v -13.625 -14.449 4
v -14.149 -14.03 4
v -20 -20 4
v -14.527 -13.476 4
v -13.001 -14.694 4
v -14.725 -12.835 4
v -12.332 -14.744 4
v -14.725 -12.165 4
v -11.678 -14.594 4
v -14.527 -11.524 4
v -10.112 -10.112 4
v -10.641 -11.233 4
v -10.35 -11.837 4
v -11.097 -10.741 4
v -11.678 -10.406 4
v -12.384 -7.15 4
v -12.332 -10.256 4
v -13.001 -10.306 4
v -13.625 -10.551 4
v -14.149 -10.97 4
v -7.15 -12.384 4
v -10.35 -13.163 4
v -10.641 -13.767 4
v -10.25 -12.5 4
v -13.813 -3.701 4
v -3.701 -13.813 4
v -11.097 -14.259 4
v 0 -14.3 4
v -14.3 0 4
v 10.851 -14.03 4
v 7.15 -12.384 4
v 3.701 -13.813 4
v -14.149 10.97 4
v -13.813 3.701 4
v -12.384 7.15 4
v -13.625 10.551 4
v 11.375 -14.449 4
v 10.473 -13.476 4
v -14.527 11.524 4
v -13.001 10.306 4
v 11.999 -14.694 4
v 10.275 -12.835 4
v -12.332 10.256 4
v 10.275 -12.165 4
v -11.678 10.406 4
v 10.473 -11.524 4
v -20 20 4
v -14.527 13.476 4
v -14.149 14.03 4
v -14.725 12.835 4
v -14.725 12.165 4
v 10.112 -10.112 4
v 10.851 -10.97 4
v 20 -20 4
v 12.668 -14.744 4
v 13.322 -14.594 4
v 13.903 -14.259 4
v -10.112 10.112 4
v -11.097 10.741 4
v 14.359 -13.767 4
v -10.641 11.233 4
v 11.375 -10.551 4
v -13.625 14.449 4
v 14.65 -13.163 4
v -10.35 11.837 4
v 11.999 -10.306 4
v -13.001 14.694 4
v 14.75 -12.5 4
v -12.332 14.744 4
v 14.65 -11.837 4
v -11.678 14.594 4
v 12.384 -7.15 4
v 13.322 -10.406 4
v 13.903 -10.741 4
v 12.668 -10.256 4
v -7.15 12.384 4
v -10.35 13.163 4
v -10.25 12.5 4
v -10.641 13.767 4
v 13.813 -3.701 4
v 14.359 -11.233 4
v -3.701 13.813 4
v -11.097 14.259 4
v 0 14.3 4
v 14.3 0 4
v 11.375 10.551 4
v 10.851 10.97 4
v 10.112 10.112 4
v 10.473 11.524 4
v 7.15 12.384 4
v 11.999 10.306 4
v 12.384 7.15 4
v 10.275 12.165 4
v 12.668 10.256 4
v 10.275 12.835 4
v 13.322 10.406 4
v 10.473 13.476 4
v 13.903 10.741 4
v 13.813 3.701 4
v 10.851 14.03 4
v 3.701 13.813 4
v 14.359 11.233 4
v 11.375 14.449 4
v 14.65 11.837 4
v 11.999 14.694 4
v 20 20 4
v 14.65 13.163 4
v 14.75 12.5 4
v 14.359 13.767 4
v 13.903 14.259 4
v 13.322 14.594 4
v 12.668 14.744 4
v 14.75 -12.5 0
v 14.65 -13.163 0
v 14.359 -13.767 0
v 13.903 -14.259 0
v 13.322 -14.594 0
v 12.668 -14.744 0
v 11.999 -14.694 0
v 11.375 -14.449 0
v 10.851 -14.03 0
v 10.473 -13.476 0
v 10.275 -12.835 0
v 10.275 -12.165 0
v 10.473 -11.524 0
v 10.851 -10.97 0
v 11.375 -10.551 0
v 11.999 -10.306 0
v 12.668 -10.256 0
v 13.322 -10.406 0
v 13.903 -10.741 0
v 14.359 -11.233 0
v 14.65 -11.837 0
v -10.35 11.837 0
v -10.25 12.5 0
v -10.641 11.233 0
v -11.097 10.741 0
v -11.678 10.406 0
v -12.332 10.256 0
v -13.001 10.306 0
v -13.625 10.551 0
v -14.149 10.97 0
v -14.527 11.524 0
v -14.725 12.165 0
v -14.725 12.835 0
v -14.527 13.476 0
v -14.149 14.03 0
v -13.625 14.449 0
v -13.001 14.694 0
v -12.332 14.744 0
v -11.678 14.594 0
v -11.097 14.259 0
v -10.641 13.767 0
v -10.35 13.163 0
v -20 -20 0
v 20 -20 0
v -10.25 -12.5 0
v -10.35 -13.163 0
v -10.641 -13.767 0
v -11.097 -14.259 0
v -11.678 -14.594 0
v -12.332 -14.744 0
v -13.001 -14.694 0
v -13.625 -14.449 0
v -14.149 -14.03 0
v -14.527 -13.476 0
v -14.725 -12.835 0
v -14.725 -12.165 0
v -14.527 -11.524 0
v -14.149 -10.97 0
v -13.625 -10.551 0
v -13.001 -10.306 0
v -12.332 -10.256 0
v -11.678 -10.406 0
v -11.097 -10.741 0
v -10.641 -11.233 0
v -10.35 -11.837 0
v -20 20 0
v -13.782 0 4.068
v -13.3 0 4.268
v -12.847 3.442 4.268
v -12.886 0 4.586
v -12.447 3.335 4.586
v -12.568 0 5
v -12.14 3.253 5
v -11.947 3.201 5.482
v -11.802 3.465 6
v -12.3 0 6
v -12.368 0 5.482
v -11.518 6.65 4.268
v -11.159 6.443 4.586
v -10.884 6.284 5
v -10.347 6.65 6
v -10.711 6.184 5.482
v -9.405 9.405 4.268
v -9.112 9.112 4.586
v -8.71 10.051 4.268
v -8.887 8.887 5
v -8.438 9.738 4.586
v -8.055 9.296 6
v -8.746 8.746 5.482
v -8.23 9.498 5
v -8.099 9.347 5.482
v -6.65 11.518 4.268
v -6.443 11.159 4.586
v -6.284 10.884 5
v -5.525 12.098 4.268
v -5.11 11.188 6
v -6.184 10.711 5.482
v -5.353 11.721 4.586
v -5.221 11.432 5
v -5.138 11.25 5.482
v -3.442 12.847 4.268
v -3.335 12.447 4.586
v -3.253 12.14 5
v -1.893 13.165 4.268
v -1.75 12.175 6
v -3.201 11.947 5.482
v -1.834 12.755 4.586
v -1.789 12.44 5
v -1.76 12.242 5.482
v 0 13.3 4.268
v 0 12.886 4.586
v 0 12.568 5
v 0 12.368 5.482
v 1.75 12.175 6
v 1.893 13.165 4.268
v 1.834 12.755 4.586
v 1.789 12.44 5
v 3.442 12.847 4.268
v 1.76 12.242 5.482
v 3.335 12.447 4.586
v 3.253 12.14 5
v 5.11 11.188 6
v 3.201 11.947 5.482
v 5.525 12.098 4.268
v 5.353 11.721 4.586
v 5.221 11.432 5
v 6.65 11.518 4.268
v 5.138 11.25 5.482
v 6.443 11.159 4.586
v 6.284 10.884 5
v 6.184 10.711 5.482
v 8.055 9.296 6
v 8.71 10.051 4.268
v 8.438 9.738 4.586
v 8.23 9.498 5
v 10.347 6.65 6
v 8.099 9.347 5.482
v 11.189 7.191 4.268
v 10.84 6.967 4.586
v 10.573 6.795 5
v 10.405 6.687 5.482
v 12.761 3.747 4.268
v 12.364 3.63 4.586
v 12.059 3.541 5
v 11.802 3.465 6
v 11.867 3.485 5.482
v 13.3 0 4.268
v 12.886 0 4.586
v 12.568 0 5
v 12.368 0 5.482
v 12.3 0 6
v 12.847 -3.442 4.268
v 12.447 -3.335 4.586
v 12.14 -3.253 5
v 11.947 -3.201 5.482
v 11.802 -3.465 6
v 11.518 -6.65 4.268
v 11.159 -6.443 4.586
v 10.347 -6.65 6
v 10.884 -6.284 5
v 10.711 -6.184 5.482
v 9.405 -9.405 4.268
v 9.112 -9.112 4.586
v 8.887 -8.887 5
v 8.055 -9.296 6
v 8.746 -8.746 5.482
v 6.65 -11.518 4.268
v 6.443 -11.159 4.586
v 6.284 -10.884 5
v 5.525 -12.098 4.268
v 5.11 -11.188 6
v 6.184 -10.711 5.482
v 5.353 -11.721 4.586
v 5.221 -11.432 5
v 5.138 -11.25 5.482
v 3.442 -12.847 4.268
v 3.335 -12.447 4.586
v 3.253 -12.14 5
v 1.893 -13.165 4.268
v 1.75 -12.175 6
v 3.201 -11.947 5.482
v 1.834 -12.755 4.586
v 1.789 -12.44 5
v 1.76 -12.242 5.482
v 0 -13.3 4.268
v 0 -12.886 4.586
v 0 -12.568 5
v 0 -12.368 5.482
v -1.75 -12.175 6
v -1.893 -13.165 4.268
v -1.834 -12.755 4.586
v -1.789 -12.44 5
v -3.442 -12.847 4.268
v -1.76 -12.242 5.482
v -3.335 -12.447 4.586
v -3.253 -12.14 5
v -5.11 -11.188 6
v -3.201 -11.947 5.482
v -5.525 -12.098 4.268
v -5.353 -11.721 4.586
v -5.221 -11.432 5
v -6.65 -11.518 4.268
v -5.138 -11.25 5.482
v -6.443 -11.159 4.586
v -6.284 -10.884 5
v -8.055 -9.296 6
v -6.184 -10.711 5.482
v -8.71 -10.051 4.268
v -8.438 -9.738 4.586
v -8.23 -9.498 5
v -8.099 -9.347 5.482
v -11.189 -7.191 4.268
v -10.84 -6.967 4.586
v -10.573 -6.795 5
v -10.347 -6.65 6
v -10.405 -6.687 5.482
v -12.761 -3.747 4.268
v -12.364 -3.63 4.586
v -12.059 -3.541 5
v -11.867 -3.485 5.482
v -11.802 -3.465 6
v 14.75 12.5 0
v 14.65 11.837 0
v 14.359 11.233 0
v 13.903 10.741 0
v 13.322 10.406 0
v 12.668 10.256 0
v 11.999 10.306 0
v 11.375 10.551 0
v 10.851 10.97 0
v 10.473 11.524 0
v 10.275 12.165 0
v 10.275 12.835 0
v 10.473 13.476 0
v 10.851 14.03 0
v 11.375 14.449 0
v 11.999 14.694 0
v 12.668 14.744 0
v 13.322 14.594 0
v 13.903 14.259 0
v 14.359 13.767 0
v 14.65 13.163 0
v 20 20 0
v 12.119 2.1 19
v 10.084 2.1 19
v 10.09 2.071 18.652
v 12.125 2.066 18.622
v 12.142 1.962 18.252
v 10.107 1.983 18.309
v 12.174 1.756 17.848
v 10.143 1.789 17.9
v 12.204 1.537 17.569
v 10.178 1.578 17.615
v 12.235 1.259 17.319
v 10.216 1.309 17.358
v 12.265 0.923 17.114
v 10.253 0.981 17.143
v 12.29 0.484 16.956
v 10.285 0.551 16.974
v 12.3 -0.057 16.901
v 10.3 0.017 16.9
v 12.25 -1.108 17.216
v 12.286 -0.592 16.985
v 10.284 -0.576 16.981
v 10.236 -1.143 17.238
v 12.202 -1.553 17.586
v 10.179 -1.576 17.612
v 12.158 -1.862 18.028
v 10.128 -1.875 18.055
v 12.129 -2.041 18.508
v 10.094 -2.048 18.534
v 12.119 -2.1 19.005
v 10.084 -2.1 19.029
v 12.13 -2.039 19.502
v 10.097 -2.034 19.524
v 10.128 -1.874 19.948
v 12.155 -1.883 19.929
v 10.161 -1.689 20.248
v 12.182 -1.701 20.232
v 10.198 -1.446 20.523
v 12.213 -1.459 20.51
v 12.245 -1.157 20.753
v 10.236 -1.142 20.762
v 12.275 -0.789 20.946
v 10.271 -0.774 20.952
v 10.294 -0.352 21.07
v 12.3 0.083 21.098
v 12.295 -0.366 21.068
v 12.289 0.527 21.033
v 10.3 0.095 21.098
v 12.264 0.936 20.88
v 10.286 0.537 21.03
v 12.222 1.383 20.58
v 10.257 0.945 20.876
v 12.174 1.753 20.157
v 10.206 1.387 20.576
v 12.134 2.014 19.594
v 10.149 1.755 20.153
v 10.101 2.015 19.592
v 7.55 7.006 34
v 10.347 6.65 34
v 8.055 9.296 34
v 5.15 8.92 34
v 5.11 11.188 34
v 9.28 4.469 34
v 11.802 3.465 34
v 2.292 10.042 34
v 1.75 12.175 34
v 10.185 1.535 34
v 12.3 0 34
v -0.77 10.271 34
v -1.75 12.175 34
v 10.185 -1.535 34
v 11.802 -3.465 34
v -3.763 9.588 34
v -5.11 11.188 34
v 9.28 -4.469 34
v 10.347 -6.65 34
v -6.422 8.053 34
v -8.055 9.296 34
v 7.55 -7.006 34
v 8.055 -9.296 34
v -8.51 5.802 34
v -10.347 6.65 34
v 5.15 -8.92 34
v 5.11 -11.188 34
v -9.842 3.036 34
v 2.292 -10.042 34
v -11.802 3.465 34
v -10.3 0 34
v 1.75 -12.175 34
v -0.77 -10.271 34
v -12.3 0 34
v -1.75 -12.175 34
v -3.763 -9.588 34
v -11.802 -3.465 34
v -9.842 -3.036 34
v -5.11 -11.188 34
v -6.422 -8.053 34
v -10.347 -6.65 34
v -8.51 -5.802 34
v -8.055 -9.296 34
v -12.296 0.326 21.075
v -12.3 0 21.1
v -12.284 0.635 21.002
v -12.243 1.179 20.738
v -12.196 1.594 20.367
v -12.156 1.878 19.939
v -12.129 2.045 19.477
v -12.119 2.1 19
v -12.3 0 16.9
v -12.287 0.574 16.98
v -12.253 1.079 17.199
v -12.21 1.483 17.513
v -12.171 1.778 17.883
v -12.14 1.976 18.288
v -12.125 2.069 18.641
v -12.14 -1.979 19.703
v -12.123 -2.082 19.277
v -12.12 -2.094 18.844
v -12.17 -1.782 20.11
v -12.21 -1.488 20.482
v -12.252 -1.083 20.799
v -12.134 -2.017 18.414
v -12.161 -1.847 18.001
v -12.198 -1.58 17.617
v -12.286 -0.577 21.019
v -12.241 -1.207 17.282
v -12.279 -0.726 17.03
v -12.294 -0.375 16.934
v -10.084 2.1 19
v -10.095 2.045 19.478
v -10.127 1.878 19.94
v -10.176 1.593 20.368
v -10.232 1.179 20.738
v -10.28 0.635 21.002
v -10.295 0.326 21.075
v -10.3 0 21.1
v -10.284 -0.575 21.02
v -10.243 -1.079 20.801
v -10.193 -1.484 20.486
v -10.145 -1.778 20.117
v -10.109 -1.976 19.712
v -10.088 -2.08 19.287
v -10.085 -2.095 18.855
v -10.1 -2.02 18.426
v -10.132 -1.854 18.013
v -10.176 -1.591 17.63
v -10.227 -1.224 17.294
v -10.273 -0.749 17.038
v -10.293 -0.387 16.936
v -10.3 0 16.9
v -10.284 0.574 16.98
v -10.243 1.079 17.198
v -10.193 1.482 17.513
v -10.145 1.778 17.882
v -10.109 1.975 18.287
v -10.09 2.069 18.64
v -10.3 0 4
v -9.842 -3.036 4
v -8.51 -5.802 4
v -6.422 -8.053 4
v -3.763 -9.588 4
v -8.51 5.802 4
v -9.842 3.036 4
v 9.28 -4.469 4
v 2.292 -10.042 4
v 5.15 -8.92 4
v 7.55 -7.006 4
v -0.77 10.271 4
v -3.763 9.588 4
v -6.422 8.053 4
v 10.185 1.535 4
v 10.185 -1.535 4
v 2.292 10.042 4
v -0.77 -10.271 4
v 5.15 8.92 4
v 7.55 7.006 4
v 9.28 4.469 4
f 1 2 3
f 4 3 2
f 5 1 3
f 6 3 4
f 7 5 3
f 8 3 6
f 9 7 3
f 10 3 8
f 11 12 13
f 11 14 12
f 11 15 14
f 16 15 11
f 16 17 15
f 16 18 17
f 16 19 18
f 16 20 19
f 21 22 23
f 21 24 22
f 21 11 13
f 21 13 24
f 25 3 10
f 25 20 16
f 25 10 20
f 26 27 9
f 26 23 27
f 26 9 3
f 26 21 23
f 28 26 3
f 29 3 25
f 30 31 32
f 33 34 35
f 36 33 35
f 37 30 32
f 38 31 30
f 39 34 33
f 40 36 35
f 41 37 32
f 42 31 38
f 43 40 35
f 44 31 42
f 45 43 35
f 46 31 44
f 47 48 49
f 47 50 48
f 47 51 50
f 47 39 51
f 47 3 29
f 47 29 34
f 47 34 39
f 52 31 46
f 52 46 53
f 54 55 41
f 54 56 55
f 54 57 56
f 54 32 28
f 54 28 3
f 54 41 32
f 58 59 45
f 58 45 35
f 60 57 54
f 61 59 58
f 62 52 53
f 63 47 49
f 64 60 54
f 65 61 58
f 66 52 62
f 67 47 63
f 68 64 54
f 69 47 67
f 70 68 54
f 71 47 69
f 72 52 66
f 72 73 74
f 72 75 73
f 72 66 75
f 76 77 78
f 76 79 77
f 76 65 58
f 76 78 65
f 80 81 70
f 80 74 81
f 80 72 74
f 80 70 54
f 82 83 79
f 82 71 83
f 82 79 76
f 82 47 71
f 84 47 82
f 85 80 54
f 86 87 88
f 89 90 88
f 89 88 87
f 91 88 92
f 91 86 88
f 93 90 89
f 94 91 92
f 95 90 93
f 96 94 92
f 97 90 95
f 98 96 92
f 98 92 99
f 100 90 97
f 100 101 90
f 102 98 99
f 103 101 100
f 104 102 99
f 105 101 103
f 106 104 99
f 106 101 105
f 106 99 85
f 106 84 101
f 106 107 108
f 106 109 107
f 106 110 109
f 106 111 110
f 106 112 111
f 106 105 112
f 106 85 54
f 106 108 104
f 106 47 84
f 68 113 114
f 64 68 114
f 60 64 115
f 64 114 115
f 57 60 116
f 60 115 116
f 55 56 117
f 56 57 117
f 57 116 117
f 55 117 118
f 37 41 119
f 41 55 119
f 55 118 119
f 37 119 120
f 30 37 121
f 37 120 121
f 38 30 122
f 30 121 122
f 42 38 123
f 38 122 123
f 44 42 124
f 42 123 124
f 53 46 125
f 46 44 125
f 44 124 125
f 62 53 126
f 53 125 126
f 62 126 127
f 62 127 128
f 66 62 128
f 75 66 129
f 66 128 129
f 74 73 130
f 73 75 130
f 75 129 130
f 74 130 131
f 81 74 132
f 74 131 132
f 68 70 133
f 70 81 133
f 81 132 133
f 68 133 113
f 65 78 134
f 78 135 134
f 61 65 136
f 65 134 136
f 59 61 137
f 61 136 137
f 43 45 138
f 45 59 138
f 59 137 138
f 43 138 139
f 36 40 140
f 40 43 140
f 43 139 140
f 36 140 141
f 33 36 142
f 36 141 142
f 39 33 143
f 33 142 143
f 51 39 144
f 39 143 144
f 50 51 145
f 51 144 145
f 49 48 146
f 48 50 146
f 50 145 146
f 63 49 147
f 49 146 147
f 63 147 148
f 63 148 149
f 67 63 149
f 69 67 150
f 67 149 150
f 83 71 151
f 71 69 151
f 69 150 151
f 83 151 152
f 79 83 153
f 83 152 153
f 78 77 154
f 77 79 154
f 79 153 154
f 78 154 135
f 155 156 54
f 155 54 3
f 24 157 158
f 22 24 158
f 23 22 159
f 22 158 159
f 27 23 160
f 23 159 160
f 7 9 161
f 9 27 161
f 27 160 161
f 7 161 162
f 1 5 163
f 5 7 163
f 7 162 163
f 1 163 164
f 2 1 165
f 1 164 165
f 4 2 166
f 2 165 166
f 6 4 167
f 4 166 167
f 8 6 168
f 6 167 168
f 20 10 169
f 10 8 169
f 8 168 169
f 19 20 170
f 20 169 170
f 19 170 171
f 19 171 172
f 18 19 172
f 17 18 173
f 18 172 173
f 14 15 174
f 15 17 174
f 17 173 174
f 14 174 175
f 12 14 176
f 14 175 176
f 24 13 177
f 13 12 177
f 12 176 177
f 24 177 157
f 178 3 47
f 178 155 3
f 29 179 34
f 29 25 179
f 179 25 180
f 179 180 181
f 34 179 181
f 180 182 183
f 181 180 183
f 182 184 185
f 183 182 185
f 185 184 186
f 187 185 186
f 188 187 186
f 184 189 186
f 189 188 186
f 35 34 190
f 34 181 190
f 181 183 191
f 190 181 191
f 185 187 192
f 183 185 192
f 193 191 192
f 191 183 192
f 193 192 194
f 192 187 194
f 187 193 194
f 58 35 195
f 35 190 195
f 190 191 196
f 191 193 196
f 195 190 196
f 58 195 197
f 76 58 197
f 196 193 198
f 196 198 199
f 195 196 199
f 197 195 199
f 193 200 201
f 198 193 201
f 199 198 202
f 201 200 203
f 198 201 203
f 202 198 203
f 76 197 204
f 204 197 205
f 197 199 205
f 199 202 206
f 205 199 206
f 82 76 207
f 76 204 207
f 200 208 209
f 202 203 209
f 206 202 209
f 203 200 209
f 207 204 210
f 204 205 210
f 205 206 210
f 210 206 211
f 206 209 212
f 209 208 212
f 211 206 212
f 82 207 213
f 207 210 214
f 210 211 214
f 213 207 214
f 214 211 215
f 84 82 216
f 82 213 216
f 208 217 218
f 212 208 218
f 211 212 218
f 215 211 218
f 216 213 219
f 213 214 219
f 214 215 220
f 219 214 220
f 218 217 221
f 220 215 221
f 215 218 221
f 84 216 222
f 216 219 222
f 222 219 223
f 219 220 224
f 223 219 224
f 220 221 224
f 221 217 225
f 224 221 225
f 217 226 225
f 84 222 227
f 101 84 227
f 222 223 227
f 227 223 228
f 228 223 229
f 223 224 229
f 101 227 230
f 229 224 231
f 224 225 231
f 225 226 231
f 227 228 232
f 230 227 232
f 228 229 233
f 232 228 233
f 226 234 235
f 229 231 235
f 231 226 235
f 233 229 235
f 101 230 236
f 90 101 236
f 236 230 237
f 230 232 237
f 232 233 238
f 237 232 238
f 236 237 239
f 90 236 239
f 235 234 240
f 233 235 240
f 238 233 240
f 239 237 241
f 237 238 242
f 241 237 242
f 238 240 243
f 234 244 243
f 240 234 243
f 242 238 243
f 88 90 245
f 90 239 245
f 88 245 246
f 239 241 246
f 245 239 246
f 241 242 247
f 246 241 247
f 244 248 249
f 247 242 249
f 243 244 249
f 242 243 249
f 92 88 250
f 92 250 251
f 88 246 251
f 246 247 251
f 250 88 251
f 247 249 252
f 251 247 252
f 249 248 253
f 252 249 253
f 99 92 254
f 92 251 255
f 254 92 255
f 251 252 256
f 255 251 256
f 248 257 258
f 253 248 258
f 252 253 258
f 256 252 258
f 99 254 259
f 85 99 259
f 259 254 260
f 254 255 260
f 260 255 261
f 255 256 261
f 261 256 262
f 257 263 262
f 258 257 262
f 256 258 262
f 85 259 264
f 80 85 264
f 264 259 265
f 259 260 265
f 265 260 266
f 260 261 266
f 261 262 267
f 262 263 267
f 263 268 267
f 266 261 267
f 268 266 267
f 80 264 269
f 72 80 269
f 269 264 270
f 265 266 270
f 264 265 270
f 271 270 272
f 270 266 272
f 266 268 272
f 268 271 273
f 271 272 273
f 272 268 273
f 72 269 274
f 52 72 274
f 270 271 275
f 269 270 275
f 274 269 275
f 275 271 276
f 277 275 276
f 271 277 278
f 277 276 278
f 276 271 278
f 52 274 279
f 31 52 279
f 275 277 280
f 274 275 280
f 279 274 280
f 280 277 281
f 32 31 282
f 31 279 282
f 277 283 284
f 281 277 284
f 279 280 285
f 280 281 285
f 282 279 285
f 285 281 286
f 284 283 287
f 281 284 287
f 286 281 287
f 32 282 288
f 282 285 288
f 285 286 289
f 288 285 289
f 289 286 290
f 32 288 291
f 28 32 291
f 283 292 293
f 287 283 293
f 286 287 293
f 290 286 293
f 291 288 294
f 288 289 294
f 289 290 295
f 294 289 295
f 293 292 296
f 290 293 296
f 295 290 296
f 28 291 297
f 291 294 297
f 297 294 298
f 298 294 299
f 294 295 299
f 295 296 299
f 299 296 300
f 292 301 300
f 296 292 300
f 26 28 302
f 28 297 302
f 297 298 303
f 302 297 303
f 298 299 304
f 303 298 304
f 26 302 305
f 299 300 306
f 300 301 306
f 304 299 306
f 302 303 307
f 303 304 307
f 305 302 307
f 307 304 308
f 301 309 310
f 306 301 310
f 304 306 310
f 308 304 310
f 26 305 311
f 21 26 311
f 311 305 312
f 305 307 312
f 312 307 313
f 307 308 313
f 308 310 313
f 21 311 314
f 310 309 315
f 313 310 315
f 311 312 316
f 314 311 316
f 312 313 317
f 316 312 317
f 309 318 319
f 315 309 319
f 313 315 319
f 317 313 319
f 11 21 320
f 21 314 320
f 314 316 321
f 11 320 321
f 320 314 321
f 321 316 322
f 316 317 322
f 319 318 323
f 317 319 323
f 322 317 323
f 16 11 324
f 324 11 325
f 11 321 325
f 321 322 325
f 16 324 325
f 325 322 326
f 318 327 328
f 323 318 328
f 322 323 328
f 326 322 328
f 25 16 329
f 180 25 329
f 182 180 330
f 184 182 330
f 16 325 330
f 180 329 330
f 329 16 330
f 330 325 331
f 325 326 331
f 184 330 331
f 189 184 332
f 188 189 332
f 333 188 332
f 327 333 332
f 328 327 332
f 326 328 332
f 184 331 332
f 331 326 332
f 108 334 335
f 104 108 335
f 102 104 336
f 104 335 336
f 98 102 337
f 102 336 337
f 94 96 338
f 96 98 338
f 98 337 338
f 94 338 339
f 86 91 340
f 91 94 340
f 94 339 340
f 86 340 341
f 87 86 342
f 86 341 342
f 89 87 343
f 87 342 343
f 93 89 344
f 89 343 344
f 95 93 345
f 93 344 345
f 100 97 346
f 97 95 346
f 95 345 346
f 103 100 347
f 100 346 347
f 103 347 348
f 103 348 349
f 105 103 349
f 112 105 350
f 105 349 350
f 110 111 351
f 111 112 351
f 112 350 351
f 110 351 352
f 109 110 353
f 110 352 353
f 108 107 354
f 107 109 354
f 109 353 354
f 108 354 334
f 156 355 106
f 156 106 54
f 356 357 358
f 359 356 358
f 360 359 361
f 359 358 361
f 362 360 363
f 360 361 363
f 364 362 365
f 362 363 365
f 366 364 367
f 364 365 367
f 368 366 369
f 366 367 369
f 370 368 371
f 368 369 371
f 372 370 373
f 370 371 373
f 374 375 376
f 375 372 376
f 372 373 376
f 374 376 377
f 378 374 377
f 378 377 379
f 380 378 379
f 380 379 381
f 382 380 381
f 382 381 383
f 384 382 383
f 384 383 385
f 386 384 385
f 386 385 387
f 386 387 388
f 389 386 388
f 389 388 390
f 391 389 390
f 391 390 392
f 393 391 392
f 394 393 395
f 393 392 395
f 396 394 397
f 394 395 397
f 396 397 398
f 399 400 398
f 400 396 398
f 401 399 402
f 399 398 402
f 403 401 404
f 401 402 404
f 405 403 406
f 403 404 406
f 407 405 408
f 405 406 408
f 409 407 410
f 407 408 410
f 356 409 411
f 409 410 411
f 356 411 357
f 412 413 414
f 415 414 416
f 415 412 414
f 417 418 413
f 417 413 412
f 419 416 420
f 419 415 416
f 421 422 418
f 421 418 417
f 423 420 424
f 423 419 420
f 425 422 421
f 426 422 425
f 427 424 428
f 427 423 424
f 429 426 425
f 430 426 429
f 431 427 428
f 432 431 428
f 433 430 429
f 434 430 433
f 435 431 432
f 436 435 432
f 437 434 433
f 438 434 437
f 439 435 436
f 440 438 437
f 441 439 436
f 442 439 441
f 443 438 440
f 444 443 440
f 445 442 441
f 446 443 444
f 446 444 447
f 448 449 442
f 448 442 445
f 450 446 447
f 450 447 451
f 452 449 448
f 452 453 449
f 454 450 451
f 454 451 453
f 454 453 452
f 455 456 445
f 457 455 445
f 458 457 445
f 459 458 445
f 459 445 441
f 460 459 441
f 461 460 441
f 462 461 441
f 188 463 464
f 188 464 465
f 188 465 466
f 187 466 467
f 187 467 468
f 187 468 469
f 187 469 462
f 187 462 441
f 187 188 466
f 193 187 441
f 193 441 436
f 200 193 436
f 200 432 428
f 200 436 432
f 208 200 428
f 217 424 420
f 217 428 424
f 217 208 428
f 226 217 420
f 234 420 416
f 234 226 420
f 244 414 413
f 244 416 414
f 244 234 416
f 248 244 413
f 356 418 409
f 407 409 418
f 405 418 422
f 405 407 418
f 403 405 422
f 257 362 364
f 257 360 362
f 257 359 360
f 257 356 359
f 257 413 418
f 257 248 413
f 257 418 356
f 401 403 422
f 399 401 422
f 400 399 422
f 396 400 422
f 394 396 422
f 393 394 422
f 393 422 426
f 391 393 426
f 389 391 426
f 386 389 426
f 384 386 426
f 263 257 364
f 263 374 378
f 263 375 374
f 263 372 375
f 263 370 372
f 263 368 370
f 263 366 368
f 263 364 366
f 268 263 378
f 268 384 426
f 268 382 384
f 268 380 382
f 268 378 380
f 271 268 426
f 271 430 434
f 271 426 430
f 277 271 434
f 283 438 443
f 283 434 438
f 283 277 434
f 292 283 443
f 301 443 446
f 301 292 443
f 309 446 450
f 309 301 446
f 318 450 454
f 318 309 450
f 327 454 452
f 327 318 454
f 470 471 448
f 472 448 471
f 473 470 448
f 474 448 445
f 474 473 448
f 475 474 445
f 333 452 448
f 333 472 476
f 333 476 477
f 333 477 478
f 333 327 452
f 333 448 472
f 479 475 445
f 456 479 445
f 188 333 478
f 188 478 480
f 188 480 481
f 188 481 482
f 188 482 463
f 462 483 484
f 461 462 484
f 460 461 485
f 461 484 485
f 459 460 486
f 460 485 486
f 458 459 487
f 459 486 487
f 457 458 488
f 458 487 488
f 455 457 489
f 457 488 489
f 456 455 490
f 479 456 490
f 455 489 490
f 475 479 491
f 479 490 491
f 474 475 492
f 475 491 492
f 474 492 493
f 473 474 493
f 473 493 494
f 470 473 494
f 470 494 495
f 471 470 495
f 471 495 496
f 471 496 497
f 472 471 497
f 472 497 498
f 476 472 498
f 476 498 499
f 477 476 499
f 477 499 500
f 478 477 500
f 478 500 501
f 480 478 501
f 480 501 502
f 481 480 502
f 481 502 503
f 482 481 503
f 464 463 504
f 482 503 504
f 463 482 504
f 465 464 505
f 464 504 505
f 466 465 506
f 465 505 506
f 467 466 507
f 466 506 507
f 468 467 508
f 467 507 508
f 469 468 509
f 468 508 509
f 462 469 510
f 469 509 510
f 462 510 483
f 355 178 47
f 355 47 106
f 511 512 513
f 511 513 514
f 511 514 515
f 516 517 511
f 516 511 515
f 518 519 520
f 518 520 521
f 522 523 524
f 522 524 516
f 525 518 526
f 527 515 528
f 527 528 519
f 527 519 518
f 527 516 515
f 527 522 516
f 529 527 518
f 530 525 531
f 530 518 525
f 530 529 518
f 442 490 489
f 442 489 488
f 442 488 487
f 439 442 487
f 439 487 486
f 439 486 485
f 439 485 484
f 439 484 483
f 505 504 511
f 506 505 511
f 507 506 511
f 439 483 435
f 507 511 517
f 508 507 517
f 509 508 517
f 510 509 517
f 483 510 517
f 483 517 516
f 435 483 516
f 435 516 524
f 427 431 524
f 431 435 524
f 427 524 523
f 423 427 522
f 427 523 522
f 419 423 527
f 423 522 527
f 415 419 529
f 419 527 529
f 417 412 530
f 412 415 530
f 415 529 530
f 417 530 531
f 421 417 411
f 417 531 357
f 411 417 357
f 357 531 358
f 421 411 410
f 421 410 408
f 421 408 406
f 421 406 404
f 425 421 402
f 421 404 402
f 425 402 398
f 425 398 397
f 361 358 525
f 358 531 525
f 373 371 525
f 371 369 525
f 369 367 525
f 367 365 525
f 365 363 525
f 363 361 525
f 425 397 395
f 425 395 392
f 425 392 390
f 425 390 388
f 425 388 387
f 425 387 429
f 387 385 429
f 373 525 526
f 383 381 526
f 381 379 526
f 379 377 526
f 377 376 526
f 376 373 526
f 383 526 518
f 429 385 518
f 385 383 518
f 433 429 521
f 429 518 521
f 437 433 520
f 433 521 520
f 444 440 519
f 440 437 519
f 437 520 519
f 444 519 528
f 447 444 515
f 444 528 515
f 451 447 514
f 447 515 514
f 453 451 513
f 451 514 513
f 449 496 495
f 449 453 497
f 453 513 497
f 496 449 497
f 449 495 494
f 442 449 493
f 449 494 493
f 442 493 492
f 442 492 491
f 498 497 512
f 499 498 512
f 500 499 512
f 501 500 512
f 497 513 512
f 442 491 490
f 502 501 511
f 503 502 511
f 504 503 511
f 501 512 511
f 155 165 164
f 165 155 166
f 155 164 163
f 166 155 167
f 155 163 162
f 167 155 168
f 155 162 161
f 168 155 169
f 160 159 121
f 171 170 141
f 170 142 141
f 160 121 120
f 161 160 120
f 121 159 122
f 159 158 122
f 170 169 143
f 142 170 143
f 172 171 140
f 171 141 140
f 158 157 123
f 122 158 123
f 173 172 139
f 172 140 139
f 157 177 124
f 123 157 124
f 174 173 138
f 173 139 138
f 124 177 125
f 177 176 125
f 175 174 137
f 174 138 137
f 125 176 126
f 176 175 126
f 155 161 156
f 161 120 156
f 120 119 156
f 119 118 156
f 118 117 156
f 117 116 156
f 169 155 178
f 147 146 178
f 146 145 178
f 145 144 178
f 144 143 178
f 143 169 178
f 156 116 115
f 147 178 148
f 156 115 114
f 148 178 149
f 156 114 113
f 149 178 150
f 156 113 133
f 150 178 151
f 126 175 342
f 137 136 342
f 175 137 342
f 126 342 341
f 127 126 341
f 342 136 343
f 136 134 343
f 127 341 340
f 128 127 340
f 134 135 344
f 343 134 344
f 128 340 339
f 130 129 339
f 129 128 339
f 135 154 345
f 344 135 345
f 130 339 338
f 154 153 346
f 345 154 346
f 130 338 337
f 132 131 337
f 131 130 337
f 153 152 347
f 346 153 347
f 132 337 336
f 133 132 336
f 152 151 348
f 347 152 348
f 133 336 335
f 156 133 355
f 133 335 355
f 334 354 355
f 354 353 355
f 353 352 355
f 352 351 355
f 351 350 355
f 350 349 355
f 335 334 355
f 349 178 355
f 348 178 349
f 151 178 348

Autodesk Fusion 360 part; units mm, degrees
sketch "Sketch1" plane through (0, 0, 0) normal (0, 0, 1) x (1, 0, 0)
  line L0 (20, -20) -> (-20, -20)
  line L1 (-20, -20) -> (-20, 20)
  line L2 (-20, 20) -> (20, 20)
  line L3 (20, 20) -> (20, -20)
  line L4 (20, -20) -> (-20, 20) construction
  line L5 (-20, -20) -> (20, 20) construction
  line L6 (12.5, -12.5) -> (-12.5, -12.5) construction
  line L7 (-12.5, -12.5) -> (-12.5, 12.5) construction
  line L8 (-12.5, 12.5) -> (12.5, 12.5) construction
  line L9 (12.5, 12.5) -> (12.5, -12.5) construction
  line L10 (12.5, -12.5) -> (-12.5, 12.5) construction
  line L11 (-12.5, -12.5) -> (12.5, 12.5) construction
  circle A0 centre (-12.5, 12.5) radius 2.25
  circle A1 centre (12.5, 12.5) radius 2.25
  circle A2 centre (12.5, -12.5) radius 2.25
  circle A3 centre (-12.5, -12.5) radius 2.25
  dimension "d1" = 40
  dimension "d2" = 40
  dimension "d3" = 25
  dimension "d4" = 25
  dimension "d5" = 4.5
  dimension "d6" = 4.5
  dimension "d7" = 4.5
  dimension "d8" = 4.5
extrude "Extrude1" add sketch "Sketch1" along normal blind 4
sketch "Sketch2" plane through (0, 0, 4) normal (0, 0, 1) x (-1, 0, 0)
  circle A0 centre (12.5, 12.5) radius 2.25
  circle A1 centre (12.5, -12.5) radius 2.25
  circle A2 centre (-12.5, -12.5) radius 2.25
  circle A3 centre (-12.5, 12.5) radius 2.25
  line L0 (-20, -20) -> (20, -20)
  line L1 (20, -20) -> (20, 20)
  line L2 (20, 20) -> (-20, 20)
  line L3 (-20, 20) -> (-20, -20)
  circle A4 centre (0, 0) radius 10.3
  circle A5 centre (0, 0) radius 12.3
  dimension "d11" = 20.6
  dimension "d12" = 2
extrude "Extrude2" add sketch "Sketch2" along normal blind 30 contours A5
sketch "Sketch3" plane through (0, 0, 0) normal (1, 0, 0) x (0, 1, 0)
  line L0 (12.3, 34) -> (-12.3, 34)
  line L1 (-12.3, 4) -> (12.3, 4)
  line L2 (-12.3, 34) -> (12.3, 4) construction
  circle A0 centre (0, 19) radius 2.1
  dimension "d15" = 4.2
extrude "Extrude3" cut sketch "Sketch3" along normal through all and the other way through all
fillet "Fillet1" radius 2 1 edges at (11.4676, -4.4479, 4)
